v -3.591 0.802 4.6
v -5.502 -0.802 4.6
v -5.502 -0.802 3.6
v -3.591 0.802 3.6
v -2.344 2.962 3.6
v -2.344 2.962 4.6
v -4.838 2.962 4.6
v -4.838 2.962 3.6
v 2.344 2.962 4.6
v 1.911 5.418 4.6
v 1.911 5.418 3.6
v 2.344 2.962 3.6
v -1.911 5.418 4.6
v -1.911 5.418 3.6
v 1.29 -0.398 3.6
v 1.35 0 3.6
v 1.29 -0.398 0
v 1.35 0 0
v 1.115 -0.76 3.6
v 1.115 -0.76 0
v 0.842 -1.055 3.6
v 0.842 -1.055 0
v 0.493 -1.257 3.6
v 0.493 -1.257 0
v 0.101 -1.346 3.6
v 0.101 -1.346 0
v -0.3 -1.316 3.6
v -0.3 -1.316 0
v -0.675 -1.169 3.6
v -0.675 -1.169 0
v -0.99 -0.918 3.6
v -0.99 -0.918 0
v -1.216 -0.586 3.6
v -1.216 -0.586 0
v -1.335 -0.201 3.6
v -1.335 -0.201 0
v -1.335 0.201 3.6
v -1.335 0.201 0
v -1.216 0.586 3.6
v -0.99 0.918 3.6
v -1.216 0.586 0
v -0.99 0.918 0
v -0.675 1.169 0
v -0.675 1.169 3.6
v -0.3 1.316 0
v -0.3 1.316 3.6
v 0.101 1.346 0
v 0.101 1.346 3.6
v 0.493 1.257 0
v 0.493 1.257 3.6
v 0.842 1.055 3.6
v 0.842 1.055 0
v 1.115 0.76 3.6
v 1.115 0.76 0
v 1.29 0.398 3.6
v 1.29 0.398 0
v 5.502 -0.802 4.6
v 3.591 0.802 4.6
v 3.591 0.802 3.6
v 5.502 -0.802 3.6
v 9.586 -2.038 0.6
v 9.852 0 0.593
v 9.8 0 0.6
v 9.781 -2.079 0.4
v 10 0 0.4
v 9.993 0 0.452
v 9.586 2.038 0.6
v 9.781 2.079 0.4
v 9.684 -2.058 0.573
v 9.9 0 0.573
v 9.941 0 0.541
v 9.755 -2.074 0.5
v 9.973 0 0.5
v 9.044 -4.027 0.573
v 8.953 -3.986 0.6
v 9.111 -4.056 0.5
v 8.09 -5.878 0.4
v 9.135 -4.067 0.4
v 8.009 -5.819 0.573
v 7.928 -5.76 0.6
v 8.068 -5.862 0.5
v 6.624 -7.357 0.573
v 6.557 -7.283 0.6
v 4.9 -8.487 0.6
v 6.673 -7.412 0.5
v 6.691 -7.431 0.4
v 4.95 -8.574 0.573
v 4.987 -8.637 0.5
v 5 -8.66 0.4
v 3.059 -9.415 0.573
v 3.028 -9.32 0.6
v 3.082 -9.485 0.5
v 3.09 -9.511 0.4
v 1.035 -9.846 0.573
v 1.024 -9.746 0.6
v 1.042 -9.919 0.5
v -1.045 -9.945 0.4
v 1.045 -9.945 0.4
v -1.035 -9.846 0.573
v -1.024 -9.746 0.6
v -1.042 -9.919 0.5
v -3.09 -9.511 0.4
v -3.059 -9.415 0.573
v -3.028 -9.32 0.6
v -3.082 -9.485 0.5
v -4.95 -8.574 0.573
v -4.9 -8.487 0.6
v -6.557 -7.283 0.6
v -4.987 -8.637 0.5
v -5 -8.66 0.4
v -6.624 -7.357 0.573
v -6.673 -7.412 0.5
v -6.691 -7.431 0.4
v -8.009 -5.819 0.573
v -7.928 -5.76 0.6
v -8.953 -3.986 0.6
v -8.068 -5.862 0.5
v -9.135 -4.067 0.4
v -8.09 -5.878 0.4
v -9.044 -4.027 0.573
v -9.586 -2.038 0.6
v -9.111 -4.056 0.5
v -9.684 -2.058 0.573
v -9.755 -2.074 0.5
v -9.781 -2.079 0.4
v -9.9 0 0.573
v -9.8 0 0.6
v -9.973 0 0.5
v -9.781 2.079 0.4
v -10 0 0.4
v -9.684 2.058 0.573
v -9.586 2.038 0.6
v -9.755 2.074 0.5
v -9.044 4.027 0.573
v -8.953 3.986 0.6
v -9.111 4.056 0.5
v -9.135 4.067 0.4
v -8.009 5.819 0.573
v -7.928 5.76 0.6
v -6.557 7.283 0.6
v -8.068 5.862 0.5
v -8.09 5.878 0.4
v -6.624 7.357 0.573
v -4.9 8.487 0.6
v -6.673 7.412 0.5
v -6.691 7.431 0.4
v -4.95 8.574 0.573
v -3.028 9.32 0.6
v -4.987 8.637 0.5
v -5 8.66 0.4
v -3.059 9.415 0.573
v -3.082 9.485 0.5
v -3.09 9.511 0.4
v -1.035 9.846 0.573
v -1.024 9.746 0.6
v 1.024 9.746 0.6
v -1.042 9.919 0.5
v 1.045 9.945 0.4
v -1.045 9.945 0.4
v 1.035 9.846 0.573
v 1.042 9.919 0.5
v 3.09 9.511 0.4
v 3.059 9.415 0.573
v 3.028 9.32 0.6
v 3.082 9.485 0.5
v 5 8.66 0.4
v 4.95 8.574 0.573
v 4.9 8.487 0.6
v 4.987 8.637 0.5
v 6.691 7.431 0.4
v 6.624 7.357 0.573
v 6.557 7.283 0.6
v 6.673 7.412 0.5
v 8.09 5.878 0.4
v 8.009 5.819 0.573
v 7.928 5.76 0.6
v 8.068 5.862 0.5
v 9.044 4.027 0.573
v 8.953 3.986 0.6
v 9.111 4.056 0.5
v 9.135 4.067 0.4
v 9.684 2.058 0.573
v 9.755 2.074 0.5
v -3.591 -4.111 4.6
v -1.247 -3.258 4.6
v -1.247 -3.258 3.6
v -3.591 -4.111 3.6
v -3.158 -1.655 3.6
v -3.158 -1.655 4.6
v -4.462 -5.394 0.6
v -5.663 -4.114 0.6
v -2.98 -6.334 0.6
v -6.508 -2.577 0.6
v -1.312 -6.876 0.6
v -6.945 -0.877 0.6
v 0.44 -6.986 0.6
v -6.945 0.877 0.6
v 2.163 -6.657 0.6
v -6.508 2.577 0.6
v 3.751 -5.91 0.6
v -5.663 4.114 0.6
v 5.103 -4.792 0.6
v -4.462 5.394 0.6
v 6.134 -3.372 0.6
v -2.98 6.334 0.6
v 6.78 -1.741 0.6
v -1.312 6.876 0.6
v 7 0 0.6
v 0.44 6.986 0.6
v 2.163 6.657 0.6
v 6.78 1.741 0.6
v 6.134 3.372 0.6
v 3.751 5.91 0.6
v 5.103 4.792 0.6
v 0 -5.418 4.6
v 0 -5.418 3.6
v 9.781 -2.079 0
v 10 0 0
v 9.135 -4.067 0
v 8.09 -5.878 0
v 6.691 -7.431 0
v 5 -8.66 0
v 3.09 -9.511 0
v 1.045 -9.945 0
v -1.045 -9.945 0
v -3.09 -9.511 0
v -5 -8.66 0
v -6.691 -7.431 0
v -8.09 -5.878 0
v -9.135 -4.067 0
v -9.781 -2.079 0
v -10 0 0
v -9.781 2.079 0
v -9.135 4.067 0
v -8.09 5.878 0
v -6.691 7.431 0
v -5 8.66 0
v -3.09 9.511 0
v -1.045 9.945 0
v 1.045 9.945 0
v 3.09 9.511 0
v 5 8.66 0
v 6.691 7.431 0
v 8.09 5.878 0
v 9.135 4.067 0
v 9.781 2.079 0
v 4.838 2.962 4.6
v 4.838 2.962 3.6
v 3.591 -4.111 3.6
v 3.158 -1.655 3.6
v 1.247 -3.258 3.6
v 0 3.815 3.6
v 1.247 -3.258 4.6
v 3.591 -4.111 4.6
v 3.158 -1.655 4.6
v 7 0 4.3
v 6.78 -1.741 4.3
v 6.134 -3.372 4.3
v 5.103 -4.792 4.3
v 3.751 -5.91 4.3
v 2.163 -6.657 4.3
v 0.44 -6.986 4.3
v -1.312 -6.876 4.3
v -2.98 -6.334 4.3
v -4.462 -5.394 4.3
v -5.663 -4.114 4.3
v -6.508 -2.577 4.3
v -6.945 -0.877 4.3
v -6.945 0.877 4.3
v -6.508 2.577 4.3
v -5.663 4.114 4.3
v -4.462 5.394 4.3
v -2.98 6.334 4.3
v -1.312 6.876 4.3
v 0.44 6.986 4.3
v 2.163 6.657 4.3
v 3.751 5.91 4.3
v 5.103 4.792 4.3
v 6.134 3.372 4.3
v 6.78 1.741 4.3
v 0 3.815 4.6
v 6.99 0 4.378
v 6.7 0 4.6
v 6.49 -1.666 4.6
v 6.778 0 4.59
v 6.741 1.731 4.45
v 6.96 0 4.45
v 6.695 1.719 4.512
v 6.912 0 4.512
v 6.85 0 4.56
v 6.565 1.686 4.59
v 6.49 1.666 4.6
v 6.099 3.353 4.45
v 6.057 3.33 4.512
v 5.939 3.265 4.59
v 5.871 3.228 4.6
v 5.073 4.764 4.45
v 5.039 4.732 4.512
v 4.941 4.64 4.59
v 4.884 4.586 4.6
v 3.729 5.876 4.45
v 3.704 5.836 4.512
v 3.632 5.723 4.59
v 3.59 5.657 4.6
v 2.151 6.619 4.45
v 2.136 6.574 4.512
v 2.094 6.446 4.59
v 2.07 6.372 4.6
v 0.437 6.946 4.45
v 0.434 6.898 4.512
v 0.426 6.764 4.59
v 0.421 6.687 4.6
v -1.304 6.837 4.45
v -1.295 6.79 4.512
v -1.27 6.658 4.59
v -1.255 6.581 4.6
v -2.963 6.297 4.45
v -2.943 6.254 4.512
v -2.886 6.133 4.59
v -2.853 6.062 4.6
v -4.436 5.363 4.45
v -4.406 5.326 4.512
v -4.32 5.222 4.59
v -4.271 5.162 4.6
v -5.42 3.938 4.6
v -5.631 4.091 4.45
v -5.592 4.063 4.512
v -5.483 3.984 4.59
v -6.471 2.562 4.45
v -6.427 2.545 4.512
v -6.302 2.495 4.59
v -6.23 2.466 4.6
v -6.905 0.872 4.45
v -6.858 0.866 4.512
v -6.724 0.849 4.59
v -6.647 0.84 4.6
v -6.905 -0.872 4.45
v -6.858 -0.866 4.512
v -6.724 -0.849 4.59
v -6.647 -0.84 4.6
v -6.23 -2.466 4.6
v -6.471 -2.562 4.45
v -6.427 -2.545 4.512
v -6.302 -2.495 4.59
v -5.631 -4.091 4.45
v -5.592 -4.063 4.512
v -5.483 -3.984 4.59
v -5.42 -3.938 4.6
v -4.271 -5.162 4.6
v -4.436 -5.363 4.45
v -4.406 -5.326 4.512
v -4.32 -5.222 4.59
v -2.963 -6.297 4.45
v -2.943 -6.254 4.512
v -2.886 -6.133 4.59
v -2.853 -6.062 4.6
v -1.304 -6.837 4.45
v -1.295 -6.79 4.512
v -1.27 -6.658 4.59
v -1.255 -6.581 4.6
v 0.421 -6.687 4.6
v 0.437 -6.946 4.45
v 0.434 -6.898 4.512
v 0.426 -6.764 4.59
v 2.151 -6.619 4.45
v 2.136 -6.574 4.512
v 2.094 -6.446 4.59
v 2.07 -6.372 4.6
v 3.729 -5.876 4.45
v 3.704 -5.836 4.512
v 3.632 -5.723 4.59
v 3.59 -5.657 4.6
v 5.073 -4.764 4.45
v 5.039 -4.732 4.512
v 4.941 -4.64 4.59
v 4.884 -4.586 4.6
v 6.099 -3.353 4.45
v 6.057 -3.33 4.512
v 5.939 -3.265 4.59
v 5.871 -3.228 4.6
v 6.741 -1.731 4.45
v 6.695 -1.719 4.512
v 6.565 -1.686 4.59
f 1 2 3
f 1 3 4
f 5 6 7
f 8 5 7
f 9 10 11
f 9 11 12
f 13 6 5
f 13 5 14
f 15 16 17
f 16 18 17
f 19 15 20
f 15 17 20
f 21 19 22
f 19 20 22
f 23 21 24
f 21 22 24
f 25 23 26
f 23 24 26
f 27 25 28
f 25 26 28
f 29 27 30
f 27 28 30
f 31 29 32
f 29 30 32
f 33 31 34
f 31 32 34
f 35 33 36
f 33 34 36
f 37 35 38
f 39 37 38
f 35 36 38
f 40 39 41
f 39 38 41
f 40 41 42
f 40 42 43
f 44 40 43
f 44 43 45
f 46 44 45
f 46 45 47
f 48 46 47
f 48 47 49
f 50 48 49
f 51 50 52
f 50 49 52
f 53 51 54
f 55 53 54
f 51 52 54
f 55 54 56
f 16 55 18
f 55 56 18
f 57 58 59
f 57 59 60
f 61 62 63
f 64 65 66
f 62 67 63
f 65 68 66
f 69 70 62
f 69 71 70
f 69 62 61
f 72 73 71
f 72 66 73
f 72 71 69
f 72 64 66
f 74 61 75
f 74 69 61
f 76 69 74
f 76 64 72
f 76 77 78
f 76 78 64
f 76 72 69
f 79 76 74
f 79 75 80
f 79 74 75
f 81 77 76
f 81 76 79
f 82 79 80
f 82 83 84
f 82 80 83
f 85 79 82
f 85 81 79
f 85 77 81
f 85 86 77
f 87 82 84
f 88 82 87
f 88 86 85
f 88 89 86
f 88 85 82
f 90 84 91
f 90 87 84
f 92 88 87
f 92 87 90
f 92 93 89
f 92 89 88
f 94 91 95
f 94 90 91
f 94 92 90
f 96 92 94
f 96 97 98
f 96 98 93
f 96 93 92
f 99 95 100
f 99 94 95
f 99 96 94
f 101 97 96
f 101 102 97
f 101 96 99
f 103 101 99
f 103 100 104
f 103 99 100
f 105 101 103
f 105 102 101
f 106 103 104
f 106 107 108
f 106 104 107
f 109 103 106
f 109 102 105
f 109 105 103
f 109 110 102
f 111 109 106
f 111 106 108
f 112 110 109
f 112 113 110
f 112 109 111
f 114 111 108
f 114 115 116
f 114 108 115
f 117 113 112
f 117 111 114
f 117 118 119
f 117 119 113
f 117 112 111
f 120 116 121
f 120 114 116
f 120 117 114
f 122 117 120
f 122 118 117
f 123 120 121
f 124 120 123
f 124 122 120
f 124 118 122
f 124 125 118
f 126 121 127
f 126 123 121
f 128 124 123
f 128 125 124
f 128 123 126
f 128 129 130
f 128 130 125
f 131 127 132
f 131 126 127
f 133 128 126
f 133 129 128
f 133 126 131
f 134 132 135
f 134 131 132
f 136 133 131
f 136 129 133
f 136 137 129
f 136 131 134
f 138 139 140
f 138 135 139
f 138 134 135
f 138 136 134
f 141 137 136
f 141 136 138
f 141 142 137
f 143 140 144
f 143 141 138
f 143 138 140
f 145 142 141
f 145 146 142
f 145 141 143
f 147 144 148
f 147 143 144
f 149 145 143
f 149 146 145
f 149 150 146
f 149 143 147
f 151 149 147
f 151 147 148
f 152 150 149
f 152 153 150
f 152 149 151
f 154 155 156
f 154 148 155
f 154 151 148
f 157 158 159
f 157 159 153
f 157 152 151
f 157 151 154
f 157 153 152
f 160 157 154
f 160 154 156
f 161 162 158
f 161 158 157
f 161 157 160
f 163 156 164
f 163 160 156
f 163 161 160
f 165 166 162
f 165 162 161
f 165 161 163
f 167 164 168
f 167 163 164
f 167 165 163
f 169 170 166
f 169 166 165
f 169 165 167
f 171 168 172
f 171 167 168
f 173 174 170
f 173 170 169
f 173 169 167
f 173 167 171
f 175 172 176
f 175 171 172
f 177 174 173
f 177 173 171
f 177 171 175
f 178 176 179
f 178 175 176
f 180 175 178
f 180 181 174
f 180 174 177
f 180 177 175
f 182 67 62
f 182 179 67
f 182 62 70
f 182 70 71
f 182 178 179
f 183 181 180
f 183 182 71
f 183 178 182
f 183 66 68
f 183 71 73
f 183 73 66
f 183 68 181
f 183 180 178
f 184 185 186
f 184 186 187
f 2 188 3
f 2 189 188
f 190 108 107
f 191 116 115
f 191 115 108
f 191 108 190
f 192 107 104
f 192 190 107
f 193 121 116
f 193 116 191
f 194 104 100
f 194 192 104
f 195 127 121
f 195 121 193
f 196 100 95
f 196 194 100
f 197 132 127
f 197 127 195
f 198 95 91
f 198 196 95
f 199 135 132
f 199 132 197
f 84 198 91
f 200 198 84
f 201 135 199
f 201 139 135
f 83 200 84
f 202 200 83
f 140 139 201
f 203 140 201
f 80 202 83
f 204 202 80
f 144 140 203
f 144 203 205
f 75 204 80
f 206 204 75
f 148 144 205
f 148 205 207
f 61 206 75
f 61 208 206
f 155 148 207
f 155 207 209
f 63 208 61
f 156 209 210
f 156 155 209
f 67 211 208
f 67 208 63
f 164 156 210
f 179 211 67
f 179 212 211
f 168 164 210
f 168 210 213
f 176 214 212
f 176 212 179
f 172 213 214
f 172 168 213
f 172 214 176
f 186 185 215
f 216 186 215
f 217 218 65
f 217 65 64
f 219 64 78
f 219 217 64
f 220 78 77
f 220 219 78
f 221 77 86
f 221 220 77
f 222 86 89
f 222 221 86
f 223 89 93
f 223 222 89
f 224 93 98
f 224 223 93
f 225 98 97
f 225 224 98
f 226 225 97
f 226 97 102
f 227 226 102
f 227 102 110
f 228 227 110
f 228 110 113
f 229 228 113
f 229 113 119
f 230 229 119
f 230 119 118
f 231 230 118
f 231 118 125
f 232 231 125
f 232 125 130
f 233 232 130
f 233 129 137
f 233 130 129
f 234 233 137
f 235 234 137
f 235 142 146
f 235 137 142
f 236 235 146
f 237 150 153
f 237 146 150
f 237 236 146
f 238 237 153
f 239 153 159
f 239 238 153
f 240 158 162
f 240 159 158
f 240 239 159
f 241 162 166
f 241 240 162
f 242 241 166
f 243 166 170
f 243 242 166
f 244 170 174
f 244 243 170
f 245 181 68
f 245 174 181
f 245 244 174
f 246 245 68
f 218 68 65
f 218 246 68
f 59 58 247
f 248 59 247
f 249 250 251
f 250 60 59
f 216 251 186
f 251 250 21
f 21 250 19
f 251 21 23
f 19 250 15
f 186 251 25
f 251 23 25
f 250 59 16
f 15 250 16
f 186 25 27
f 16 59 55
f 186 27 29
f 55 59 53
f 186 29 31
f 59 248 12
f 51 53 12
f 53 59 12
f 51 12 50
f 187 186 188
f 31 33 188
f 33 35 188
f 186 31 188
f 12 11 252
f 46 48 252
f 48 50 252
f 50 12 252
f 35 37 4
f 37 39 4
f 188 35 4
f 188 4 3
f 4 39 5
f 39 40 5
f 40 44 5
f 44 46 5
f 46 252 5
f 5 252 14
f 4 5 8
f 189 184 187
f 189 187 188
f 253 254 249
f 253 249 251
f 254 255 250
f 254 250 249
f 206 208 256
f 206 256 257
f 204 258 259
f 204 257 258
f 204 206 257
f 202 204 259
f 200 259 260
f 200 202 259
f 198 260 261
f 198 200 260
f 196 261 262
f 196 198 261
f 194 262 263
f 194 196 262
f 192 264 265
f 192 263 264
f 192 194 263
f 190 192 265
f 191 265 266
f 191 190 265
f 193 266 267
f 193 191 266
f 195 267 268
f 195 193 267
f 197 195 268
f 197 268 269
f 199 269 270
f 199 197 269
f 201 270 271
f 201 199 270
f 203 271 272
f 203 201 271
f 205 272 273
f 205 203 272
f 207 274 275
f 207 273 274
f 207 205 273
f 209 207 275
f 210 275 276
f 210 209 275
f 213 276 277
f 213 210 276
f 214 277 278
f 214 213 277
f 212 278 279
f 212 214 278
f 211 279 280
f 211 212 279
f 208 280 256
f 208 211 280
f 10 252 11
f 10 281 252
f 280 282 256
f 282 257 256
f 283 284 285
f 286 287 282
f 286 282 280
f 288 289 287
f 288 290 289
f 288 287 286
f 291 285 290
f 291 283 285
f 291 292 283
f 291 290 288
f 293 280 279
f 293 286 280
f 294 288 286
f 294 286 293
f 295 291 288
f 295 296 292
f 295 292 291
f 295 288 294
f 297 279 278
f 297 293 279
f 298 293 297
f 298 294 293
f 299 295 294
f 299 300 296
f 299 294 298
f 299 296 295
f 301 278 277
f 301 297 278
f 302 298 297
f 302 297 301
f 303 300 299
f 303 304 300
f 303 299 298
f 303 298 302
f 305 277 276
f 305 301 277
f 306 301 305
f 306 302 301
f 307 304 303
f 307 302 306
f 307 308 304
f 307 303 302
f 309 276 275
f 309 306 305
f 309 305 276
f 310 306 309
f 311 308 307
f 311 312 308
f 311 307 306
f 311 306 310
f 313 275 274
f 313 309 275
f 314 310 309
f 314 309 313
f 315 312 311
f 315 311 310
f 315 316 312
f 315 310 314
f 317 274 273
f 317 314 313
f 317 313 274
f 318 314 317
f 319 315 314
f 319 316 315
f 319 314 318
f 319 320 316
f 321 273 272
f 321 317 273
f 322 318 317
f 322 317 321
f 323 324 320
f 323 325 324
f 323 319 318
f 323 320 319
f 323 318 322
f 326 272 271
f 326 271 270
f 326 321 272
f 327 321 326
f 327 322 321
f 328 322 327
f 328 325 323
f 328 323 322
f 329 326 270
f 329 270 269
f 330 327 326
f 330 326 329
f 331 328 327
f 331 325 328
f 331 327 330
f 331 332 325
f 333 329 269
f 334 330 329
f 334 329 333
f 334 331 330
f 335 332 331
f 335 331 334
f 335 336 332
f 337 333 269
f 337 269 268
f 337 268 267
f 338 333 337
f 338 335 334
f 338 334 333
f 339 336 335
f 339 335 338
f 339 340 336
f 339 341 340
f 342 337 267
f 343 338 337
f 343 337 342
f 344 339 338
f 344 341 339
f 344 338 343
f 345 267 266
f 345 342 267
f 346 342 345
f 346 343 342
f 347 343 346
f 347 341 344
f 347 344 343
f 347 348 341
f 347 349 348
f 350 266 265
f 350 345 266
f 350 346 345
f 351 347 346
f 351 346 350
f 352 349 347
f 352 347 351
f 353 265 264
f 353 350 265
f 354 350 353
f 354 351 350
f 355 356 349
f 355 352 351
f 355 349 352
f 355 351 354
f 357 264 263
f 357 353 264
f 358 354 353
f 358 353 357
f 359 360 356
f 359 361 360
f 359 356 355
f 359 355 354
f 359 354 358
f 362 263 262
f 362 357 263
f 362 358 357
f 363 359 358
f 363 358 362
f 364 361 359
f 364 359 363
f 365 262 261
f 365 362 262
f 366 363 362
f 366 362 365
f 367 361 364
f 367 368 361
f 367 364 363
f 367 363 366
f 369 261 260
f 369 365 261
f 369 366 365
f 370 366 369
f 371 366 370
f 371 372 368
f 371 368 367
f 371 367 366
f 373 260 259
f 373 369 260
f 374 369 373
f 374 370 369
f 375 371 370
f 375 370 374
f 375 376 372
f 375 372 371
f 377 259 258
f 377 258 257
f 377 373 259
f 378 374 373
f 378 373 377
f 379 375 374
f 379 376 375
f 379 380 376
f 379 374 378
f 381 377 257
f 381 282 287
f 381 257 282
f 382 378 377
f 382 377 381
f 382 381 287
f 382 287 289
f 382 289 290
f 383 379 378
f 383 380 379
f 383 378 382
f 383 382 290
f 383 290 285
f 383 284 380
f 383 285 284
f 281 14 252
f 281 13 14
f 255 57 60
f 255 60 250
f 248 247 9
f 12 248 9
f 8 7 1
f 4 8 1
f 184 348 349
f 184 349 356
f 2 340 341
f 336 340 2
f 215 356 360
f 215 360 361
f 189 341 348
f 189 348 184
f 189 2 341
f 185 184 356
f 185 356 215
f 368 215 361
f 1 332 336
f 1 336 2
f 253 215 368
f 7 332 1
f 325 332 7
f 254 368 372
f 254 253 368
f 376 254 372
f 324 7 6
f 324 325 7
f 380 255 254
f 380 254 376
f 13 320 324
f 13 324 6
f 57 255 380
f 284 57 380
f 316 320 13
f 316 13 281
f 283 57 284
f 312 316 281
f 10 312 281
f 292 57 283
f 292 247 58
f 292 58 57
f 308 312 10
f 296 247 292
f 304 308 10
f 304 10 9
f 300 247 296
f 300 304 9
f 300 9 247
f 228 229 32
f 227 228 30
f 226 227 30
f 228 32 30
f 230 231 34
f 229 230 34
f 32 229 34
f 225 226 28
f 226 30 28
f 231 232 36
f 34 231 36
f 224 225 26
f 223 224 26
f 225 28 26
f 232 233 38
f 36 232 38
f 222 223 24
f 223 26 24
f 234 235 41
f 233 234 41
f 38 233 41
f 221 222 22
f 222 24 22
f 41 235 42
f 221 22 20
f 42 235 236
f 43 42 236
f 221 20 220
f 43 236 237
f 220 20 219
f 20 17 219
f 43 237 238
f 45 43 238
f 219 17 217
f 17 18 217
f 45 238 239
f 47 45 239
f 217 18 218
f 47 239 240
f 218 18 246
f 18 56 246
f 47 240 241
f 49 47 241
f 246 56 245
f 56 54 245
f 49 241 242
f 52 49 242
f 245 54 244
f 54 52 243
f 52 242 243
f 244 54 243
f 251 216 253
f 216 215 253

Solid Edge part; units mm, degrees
sketch "Sketch1" plane through (0, 0, 0) normal (0, 0, 1) x (1, 0, 0)
  circle A0 centre (0, 0) radius 10
extrude "Protrusion1" add sketch "Sketch1" along normal blind 0.6
sketch "Sketch2" plane through (0, 0, 0.6) normal (0, 0, 1) x (1, 0, 0)
  circle A0 centre (0, 0) radius 7
extrude "ExtrudedProtrusion_2" add sketch "Sketch2" along normal blind 4
fillet "Round_1" radius 0.3 1 edges at (-7, 0, 4.6)
fillet "Round_2" radius 0.2 1 edges at (-10, 0, 0.6)
sketch "Sketch3" plane through (0, 0, 4.6) normal (0, 0, 1) x (1, 0, 0)
  line L0 (3.5912, 0.8017) -> (5.5021, -0.8017)
  line L1 (5.5021, -0.8017) -> (3.1581, -1.6548)
  line L2 (3.1581, -1.6548) -> (3.5912, -4.1114)
  line L3 (3.5912, -4.1114) -> (1.2472, -3.2582)
  line L4 (0, -5.4185) -> (1.2472, -3.2582)
  line L5 (-1.2472, -3.2582) -> (0, -5.4185)
  line L6 (-1.2472, -3.2582) -> (-3.5912, -4.1114)
  line L7 (-3.5912, -4.1114) -> (-3.1581, -1.6548)
  line L8 (-3.1581, -1.6548) -> (-5.5021, -0.8017)
  line L9 (-5.5021, -0.8017) -> (-3.5912, 0.8017)
  line L10 (-4.8384, 2.9619) -> (-3.5912, 0.8017)
  line L11 (-2.344, 2.9619) -> (-4.8384, 2.9619)
  line L12 (-2.344, 2.9619) -> (-1.9108, 5.4185)
  line L13 (-1.9108, 5.4185) -> (0, 3.8151)
  line L14 (0, 3.8151) -> (1.9108, 5.4185)
  line L15 (1.9108, 5.4185) -> (2.344, 2.9619)
  line L16 (4.8384, 2.9619) -> (2.344, 2.9619)
  line L17 (3.5912, 0.8017) -> (4.8384, 2.9619)
extrude "ExtrudedCutout_1" cut sketch "Sketch3" against normal blind 1
sketch "Sketch4" plane through (0, 0, 0) normal (0, 0, -1) x (1, 0, 0)
  circle A0 centre (0, 0) radius 1.35
extrude "ExtrudedCutout_2" cut sketch "Sketch4" against normal blind 5
